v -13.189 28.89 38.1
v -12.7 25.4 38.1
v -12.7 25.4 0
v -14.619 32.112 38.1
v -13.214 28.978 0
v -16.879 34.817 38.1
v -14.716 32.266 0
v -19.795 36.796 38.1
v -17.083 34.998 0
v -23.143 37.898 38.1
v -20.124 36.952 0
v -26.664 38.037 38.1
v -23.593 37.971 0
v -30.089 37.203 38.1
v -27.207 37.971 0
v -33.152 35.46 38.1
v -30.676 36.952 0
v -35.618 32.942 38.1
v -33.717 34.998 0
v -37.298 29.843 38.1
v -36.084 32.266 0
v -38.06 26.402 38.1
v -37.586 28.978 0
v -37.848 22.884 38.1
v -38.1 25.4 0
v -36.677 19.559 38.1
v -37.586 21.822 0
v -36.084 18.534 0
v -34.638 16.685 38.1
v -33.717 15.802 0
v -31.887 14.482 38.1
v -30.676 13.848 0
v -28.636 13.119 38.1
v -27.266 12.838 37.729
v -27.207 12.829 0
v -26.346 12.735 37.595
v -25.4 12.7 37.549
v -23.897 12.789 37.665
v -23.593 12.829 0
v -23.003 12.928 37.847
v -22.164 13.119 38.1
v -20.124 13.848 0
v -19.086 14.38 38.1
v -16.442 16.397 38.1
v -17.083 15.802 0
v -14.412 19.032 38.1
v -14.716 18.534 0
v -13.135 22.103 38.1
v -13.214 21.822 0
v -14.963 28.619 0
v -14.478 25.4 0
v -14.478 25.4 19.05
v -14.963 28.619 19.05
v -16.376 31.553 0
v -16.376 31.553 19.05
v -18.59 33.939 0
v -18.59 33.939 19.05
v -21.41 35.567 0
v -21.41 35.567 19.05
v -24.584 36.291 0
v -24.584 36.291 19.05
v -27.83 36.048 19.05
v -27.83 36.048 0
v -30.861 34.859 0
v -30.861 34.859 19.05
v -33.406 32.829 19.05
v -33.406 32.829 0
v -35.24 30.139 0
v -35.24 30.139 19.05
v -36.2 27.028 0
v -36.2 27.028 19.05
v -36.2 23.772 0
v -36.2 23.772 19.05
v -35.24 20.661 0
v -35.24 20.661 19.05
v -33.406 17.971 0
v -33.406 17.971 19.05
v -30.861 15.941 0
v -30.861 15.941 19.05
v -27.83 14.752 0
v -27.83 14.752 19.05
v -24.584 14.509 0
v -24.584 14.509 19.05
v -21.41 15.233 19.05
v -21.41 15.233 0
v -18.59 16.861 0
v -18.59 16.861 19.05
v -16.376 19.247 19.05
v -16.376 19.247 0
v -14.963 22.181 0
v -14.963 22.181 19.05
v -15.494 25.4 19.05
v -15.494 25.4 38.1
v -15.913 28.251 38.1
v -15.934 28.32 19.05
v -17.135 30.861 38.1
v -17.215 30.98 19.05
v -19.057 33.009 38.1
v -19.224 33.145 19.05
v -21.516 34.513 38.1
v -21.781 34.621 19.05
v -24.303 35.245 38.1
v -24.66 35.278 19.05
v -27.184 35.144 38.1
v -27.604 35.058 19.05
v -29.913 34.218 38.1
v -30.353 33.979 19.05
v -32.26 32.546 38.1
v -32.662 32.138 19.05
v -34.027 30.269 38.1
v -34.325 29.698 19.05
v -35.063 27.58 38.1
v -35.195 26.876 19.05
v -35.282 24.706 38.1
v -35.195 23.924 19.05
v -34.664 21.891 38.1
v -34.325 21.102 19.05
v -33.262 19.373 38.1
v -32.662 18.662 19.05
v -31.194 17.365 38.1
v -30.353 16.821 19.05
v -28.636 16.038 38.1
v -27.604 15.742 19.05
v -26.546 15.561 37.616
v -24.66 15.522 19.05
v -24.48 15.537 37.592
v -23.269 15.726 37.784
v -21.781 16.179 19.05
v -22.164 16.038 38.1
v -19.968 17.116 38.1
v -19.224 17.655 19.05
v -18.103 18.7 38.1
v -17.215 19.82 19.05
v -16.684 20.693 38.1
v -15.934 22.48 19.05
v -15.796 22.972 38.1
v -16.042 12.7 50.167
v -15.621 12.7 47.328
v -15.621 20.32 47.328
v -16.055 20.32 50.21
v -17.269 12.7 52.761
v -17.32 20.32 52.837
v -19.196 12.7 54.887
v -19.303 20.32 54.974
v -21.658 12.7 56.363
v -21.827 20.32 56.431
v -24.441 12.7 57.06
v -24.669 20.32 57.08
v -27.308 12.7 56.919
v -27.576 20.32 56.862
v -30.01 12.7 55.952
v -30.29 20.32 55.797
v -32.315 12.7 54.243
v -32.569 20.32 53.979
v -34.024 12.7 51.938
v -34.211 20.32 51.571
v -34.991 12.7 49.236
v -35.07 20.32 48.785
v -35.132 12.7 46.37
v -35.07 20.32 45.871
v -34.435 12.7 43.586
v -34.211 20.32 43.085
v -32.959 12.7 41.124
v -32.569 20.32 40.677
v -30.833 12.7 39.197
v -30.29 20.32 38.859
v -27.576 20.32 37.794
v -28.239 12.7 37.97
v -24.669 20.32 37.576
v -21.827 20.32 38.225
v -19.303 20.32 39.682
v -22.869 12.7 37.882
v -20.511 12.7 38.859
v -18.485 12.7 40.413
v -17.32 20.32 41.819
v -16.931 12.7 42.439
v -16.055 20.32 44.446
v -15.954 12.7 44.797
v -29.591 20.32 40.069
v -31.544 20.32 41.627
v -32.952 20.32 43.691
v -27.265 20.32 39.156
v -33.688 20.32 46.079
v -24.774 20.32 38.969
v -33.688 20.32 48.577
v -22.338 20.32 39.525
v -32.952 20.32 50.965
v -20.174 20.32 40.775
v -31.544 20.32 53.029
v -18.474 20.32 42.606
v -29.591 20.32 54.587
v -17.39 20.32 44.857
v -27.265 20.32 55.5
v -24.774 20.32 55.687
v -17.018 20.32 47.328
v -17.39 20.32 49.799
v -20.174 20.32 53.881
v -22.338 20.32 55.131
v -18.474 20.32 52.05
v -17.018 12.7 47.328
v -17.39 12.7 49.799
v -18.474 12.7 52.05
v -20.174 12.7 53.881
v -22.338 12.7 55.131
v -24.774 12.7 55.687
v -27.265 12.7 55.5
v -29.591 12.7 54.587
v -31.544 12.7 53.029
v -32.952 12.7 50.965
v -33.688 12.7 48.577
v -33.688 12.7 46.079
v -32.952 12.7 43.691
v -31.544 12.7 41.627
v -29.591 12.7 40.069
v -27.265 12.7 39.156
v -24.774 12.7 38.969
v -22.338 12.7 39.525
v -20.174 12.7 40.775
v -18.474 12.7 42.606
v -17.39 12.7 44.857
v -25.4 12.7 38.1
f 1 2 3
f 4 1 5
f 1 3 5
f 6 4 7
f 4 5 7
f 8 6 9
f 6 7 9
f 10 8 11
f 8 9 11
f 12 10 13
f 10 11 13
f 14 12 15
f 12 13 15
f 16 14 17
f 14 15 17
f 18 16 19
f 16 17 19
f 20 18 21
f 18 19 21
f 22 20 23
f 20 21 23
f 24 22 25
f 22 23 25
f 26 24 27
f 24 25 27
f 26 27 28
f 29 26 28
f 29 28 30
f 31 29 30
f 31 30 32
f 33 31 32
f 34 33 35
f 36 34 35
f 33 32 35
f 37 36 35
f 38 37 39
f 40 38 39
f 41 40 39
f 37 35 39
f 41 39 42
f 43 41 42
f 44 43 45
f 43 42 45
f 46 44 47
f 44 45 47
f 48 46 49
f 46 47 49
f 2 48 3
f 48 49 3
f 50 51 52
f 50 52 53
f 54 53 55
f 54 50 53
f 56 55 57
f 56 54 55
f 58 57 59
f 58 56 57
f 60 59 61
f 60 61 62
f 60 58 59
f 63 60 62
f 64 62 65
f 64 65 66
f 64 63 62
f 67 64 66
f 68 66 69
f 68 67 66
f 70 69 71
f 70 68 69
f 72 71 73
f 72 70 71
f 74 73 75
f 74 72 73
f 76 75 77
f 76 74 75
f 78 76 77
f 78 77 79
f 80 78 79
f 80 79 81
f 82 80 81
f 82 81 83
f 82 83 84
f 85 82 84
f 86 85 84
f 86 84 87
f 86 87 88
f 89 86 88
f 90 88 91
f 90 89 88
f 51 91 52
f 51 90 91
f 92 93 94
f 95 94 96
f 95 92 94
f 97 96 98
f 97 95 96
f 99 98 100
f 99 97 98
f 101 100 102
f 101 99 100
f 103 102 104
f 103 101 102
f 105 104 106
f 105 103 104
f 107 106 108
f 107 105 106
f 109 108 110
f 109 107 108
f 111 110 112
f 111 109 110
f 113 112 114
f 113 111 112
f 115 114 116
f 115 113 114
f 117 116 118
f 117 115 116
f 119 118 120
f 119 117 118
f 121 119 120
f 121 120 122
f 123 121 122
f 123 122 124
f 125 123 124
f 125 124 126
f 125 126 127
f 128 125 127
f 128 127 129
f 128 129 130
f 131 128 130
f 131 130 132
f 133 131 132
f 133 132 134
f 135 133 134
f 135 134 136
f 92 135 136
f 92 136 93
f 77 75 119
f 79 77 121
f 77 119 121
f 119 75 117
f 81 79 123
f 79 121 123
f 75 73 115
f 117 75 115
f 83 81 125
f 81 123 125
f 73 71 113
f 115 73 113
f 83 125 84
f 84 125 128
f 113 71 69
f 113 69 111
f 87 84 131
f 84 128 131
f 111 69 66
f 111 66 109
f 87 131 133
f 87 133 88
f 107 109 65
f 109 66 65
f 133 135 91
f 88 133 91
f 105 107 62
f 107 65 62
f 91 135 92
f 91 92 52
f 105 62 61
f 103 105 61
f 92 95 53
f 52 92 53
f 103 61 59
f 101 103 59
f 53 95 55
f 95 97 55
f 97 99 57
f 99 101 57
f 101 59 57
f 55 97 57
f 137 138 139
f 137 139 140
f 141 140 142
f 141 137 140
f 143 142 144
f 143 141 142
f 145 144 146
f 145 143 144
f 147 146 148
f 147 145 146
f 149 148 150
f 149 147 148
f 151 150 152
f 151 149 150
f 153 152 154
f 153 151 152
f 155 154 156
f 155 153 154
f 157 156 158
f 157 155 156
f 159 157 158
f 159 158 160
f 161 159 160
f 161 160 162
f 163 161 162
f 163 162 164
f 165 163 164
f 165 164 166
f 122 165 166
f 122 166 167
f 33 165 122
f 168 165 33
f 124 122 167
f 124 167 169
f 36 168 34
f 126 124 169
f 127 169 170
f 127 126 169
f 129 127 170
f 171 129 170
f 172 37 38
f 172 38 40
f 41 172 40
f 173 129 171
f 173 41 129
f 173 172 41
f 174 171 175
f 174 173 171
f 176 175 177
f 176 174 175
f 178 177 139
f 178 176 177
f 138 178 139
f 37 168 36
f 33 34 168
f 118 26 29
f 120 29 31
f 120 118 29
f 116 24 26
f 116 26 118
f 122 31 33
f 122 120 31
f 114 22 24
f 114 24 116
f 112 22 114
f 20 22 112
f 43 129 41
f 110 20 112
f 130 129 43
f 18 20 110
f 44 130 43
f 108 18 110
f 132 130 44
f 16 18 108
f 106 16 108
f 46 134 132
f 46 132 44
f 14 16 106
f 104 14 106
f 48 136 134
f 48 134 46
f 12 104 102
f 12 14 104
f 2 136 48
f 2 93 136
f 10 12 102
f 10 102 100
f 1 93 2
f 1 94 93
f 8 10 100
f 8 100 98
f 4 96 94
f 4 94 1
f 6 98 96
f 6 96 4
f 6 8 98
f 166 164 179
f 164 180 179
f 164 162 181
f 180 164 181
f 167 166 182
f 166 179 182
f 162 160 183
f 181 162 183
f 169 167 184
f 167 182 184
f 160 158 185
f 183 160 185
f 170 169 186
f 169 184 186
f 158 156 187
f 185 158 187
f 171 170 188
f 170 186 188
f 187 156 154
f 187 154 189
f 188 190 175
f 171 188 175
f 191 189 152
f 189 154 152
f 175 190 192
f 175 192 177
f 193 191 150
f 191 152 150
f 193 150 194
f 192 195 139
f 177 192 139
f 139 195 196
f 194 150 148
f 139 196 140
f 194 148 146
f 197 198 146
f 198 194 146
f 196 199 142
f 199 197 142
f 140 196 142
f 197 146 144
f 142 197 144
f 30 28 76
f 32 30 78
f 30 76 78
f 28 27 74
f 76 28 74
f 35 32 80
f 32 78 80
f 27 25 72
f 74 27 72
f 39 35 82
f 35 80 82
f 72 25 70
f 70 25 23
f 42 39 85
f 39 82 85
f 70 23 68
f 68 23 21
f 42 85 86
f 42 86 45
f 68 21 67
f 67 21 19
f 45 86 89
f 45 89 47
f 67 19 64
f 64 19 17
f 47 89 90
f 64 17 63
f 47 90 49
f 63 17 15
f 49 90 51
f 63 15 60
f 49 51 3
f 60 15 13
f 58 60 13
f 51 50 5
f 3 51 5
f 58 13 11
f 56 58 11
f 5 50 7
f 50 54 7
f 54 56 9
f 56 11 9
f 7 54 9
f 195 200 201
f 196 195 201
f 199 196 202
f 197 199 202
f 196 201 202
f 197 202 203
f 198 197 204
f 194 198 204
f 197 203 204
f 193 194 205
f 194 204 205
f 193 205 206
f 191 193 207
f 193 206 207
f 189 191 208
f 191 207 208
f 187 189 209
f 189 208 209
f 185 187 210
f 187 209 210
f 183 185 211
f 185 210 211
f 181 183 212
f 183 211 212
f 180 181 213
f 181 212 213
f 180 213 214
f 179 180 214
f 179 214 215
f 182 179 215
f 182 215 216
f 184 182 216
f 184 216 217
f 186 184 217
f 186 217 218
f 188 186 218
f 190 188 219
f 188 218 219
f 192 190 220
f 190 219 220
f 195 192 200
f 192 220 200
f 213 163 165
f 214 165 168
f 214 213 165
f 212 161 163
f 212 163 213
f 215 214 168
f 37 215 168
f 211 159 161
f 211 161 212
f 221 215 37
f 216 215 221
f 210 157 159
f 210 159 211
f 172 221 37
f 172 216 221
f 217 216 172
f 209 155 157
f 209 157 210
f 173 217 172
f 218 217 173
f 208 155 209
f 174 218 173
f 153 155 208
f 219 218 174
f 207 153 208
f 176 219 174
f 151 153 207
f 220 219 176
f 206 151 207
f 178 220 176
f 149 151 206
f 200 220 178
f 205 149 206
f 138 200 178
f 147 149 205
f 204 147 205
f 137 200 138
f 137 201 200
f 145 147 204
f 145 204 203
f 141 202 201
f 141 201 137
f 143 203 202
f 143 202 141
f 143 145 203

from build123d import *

# Parameters (mm, degrees)
F0_R     = 12.7
F0_R_2   = 10.922
F1_DEPTH = 19.05
F3_R     = 9.779
F3_R_2   = 8.382
F4_DEPTH = 7.62
F5_R     = 12.7
F5_R_2   = 9.906
F6_DEPTH = 19.05


with BuildPart() as f1:
    # F0 (on Top) → F1 (new body)
    with BuildSketch(Plane.XY):
        with Locations((-25.4, 25.4)):
            Circle(F0_R)
        with Locations((-25.4, 25.4)):
            Circle(F0_R_2, mode=Mode.SUBTRACT)
    extrude(amount=F1_DEPTH)



with BuildPart() as f4:
    # F3 (on offset) → F4 (new body)
    with BuildSketch(Plane.XZ.offset(-12.7)):
        with Locations((-25.4, 47.3280113715)):
            Circle(F3_R)
        with Locations((-25.4, 47.3280113715)):
            Circle(F3_R_2, mode=Mode.SUBTRACT)
    extrude(amount=-F4_DEPTH)


with BuildPart() as f1_1:
    add(f1.part)

    add(f4.part)  # F6 merges F4
    # F5 (on face) → F6 (join)
    with BuildSketch(Plane.XY.offset(19.05)):
        with Locations((-25.4, 25.4)):
            Circle(F5_R)
        with Locations((-25.4, 25.4)):
            Circle(F5_R_2, mode=Mode.SUBTRACT)
    extrude(amount=F6_DEPTH)


solid = f1_1.part
